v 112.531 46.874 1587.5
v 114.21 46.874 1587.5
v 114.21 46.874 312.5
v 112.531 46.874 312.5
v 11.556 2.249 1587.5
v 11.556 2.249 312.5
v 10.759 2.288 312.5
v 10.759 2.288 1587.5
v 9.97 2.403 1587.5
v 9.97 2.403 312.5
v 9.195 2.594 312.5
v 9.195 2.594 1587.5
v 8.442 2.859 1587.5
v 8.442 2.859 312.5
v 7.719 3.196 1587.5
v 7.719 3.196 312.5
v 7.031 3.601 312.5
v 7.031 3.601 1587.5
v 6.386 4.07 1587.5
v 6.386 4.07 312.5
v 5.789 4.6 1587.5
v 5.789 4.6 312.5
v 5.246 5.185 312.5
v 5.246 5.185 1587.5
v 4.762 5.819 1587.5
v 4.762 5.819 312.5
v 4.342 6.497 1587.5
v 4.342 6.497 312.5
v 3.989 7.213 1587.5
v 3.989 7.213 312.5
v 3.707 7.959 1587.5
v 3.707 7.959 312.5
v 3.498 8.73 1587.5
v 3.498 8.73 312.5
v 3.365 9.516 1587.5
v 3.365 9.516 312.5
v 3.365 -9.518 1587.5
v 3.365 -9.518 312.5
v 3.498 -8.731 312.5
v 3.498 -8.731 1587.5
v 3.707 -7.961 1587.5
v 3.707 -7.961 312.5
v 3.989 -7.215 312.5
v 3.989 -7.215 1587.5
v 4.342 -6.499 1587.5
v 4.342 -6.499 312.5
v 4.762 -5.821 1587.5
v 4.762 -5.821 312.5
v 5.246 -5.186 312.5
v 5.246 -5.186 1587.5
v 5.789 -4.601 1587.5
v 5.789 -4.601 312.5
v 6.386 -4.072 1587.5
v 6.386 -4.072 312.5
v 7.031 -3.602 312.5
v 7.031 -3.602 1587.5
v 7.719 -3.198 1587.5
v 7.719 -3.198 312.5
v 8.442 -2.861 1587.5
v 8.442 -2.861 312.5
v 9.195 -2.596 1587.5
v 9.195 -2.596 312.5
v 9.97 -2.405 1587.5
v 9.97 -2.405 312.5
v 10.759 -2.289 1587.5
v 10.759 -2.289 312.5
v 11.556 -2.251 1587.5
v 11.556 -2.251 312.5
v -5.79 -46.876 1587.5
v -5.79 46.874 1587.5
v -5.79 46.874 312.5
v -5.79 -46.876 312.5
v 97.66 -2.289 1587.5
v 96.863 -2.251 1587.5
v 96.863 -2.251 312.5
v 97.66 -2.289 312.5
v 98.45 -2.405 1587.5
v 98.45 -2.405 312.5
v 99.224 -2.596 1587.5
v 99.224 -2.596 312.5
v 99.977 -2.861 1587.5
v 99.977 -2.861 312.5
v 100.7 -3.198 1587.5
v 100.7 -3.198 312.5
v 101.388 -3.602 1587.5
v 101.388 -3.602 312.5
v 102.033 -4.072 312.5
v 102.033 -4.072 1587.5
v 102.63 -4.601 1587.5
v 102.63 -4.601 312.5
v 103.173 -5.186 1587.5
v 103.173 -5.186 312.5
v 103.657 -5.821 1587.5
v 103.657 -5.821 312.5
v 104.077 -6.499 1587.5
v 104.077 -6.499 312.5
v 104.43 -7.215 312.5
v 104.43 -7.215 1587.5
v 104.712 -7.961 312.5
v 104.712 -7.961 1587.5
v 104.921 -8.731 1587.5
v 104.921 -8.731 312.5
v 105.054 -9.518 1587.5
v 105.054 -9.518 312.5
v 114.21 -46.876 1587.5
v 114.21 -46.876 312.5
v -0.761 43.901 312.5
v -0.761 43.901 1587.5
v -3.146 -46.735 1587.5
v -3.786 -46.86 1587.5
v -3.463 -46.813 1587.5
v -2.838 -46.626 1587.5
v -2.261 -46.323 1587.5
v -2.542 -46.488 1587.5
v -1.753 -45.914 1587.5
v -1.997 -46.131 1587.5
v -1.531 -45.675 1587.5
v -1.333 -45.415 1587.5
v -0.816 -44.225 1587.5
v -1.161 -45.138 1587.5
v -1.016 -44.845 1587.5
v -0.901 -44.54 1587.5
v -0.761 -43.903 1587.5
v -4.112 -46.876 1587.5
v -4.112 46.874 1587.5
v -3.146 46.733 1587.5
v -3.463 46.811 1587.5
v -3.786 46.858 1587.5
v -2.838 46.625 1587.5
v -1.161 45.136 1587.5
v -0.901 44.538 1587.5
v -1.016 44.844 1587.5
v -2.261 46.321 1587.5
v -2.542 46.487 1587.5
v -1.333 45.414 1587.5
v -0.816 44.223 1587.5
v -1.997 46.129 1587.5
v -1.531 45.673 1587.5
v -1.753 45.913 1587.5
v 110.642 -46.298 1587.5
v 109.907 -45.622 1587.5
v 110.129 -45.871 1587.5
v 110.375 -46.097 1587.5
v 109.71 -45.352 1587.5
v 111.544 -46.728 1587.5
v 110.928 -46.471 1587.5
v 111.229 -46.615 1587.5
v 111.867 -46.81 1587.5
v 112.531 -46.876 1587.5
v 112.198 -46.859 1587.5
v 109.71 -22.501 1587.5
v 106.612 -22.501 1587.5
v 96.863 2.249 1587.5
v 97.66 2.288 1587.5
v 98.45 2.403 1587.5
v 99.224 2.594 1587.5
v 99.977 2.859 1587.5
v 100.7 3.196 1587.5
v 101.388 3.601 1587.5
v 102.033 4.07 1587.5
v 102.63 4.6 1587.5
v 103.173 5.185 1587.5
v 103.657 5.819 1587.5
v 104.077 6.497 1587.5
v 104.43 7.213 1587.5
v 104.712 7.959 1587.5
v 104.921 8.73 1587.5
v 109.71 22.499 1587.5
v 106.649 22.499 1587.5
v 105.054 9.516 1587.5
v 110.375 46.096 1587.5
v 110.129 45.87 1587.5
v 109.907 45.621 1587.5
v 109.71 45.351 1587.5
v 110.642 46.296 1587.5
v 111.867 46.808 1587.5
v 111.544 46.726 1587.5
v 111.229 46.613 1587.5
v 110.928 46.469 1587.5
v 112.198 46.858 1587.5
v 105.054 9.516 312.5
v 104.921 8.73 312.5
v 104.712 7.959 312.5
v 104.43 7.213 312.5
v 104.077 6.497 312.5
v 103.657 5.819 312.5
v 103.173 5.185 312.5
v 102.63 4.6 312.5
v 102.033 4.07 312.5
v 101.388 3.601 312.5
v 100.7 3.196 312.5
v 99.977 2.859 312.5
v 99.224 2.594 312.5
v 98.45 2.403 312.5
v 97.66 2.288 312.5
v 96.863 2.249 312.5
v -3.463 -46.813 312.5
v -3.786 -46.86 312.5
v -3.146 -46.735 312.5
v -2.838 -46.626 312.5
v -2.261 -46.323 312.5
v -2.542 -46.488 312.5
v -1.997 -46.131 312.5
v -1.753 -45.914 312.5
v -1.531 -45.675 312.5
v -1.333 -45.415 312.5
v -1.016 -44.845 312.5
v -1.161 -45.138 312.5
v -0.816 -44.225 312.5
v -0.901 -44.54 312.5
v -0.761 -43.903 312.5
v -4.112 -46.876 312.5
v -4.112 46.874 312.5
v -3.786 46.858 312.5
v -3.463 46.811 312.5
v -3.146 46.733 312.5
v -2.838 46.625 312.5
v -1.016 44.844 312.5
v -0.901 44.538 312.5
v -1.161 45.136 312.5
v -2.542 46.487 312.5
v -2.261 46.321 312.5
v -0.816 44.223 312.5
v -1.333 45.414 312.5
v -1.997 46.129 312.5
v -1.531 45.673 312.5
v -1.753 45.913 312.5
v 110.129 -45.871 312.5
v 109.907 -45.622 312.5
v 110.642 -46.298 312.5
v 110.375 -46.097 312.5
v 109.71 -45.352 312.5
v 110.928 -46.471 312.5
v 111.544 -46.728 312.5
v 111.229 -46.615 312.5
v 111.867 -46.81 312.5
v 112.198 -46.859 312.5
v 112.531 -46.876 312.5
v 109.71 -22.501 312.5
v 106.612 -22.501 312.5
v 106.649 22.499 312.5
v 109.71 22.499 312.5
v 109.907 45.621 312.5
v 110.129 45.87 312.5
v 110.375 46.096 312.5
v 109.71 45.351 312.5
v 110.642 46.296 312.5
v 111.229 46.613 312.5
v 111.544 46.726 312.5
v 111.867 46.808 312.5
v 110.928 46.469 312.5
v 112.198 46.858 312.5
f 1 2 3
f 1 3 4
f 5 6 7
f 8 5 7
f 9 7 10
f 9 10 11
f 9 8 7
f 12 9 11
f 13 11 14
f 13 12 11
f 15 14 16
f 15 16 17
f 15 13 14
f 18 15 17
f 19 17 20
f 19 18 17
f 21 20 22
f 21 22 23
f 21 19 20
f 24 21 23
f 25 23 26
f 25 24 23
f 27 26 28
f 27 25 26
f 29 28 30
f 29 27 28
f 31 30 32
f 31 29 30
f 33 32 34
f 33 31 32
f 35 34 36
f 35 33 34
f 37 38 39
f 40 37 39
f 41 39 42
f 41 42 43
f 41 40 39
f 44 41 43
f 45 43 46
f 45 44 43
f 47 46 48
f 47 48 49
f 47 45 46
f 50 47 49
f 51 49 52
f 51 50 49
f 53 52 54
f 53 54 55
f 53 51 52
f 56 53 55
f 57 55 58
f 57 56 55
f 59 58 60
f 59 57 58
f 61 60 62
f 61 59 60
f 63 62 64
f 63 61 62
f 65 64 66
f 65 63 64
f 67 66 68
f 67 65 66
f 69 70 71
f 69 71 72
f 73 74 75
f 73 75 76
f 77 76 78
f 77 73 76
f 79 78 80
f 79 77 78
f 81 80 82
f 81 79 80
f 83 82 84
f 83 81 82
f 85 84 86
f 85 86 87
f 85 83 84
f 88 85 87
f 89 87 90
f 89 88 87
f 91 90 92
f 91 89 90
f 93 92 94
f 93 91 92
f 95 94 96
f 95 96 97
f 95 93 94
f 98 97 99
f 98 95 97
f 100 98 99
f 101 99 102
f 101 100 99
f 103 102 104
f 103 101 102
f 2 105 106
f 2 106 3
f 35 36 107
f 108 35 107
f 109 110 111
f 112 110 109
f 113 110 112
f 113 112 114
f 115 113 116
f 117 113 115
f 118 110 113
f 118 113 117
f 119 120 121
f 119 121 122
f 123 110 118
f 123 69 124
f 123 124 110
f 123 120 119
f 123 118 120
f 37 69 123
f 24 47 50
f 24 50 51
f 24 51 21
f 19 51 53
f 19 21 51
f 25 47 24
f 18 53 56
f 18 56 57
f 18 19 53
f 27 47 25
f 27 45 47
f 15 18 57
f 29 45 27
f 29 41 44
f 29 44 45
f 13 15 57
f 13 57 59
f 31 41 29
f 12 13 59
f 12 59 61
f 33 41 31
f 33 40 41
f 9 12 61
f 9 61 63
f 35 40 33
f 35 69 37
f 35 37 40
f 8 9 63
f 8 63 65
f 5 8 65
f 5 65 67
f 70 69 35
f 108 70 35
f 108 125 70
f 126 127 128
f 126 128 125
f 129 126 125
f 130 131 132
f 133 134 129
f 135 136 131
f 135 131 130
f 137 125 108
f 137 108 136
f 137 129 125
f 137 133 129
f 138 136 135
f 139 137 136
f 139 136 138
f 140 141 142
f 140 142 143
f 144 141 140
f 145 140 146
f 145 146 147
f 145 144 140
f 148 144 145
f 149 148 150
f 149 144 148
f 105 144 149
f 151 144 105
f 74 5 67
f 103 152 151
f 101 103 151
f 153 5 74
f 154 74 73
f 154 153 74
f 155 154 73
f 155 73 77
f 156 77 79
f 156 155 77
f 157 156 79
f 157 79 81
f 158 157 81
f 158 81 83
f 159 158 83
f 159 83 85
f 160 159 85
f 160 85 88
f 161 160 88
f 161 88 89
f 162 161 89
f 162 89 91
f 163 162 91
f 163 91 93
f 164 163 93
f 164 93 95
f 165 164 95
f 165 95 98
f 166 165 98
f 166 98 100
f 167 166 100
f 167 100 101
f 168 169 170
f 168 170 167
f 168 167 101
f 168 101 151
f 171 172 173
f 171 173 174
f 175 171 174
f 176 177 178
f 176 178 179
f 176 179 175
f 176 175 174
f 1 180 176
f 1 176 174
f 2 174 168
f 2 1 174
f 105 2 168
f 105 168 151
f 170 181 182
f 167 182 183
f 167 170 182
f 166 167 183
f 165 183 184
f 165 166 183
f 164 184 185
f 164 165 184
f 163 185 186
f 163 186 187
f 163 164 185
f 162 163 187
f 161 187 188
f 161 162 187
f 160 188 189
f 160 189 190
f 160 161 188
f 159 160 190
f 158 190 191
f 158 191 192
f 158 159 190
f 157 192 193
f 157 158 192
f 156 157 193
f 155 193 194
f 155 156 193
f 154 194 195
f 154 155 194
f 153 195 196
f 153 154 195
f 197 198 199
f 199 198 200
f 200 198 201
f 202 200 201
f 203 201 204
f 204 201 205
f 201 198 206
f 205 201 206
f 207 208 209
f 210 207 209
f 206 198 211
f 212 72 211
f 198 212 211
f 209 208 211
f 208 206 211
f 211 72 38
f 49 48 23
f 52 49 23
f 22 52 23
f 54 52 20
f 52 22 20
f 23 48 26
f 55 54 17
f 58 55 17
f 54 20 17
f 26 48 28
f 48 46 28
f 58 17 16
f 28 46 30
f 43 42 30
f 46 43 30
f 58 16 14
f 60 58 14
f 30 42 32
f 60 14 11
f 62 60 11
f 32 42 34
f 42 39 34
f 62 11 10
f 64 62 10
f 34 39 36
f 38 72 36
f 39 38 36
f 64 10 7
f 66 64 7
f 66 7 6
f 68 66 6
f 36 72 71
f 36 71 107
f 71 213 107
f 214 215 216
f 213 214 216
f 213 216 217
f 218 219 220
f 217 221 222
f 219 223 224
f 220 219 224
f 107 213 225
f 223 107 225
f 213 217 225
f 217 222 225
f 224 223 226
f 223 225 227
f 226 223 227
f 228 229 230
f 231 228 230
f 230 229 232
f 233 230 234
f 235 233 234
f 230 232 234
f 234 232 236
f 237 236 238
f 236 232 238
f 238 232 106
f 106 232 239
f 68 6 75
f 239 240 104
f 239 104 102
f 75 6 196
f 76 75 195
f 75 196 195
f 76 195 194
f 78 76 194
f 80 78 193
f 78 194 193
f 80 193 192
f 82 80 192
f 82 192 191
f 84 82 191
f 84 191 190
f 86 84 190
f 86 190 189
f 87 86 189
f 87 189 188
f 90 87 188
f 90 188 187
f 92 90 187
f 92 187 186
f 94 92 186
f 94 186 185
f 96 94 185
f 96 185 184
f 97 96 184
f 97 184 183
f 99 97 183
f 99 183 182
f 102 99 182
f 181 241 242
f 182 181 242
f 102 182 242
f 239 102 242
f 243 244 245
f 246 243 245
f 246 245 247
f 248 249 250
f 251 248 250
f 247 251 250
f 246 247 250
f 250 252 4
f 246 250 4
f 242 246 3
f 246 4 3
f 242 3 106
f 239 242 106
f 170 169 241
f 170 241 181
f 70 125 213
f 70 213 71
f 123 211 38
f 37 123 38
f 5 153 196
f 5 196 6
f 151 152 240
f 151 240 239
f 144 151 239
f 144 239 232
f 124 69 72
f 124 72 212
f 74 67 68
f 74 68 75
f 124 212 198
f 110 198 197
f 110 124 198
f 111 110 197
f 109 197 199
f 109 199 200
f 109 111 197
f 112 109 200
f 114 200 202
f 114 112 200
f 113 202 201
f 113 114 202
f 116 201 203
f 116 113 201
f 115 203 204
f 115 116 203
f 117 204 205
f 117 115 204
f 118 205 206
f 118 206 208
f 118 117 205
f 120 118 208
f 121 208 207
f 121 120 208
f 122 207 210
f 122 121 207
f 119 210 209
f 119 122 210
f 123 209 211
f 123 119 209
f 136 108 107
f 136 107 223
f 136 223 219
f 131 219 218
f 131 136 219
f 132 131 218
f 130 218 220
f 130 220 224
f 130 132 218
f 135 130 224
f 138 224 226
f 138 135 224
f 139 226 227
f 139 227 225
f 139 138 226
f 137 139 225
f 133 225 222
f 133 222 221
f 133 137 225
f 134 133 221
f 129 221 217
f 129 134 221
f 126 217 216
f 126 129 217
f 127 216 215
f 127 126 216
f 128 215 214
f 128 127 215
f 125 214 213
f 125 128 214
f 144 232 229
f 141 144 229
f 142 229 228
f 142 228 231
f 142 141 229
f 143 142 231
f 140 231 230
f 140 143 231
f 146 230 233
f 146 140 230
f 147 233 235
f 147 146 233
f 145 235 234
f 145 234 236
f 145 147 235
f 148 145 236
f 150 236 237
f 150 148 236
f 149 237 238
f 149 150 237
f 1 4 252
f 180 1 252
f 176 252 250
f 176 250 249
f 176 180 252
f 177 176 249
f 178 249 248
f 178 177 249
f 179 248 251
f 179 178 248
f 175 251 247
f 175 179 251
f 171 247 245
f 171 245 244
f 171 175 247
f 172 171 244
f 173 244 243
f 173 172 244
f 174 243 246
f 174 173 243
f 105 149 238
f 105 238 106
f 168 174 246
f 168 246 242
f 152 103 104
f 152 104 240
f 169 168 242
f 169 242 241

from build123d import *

# Parameters (mm, degrees)
BOSS_EXTRUDE1_DEPTH = 1700
SCALE1_SCALE        = 0.75


with BuildPart() as part:
    # Sketch1 → Boss-Extrude1 (new body)
    with BuildSketch(Plane.XY.offset(1800)):
        with BuildLine():
            Line((129, 60.46884946), (129, 30))
            Line((129, 30), (124.919748757, 30))
            Line((124.919748757, 30), (122.792728308, 12.689402566))
            ThreePointArc((122.792728308, 12.689402566), (119.171200489, 5.771495525), (111.871083085, 3))
            Line((111.871083085, 3), (-1.871083085, 3))
            ThreePointArc((-1.871083085, 3), (-9.171200492, 5.771495528), (-12.792728309, 12.689402573))
            Line((-12.792728309, 12.689402573), (-18.294338419, 58.536153493))
            ThreePointArc((-18.294338419, 58.536153493), (-19.775872526, 61.366206375), (-22.762284192, 62.5))
            Line((-22.762284192, 62.5), (-25, 62.5))
            Line((-25, 62.5), (-25, -62.5))
            Line((-25, -62.5), (-22.762284192, -62.5))
            ThreePointArc((-22.762284192, -62.5), (-19.775872526, -61.366206375), (-18.294338419, -58.536153493))
            Line((-18.294338419, -58.536153493), (-12.792728309, -12.689402573))
            ThreePointArc((-12.792728309, -12.689402573), (-9.171200492, -5.771495528), (-1.871083085, -3))
            Line((-1.871083085, -3), (111.871083085, -3))
            ThreePointArc((111.871083085, -3), (119.171200492, -5.771495528), (122.792728309, -12.689402573))
            Line((122.792728309, -12.689402573), (124.87, -30))
            Line((124.87, -30), (129, -30))
            Line((129, -30), (129, -60.46884946))
            ThreePointArc((129, -60.46884946), (130.62450761, -61.959786773), (132.762284192, -62.5))
            Line((132.762284192, -62.5), (135, -62.5))
            Line((135, -62.5), (135, 62.5))
            Line((135, 62.5), (132.762284192, 62.5))
            ThreePointArc((132.762284192, 62.5), (130.62450761, 61.959786773), (129, 60.46884946))
        make_face()
    extrude(amount=-BOSS_EXTRUDE1_DEPTH)


with BuildPart() as part_1:
    # Scale1: scaled about (51.838667986, -0.00324275, 950)
    add(part.part.scale(SCALE1_SCALE).moved(Location((12.959666996, -0.000810687, 237.5))))


solid = part_1.part
